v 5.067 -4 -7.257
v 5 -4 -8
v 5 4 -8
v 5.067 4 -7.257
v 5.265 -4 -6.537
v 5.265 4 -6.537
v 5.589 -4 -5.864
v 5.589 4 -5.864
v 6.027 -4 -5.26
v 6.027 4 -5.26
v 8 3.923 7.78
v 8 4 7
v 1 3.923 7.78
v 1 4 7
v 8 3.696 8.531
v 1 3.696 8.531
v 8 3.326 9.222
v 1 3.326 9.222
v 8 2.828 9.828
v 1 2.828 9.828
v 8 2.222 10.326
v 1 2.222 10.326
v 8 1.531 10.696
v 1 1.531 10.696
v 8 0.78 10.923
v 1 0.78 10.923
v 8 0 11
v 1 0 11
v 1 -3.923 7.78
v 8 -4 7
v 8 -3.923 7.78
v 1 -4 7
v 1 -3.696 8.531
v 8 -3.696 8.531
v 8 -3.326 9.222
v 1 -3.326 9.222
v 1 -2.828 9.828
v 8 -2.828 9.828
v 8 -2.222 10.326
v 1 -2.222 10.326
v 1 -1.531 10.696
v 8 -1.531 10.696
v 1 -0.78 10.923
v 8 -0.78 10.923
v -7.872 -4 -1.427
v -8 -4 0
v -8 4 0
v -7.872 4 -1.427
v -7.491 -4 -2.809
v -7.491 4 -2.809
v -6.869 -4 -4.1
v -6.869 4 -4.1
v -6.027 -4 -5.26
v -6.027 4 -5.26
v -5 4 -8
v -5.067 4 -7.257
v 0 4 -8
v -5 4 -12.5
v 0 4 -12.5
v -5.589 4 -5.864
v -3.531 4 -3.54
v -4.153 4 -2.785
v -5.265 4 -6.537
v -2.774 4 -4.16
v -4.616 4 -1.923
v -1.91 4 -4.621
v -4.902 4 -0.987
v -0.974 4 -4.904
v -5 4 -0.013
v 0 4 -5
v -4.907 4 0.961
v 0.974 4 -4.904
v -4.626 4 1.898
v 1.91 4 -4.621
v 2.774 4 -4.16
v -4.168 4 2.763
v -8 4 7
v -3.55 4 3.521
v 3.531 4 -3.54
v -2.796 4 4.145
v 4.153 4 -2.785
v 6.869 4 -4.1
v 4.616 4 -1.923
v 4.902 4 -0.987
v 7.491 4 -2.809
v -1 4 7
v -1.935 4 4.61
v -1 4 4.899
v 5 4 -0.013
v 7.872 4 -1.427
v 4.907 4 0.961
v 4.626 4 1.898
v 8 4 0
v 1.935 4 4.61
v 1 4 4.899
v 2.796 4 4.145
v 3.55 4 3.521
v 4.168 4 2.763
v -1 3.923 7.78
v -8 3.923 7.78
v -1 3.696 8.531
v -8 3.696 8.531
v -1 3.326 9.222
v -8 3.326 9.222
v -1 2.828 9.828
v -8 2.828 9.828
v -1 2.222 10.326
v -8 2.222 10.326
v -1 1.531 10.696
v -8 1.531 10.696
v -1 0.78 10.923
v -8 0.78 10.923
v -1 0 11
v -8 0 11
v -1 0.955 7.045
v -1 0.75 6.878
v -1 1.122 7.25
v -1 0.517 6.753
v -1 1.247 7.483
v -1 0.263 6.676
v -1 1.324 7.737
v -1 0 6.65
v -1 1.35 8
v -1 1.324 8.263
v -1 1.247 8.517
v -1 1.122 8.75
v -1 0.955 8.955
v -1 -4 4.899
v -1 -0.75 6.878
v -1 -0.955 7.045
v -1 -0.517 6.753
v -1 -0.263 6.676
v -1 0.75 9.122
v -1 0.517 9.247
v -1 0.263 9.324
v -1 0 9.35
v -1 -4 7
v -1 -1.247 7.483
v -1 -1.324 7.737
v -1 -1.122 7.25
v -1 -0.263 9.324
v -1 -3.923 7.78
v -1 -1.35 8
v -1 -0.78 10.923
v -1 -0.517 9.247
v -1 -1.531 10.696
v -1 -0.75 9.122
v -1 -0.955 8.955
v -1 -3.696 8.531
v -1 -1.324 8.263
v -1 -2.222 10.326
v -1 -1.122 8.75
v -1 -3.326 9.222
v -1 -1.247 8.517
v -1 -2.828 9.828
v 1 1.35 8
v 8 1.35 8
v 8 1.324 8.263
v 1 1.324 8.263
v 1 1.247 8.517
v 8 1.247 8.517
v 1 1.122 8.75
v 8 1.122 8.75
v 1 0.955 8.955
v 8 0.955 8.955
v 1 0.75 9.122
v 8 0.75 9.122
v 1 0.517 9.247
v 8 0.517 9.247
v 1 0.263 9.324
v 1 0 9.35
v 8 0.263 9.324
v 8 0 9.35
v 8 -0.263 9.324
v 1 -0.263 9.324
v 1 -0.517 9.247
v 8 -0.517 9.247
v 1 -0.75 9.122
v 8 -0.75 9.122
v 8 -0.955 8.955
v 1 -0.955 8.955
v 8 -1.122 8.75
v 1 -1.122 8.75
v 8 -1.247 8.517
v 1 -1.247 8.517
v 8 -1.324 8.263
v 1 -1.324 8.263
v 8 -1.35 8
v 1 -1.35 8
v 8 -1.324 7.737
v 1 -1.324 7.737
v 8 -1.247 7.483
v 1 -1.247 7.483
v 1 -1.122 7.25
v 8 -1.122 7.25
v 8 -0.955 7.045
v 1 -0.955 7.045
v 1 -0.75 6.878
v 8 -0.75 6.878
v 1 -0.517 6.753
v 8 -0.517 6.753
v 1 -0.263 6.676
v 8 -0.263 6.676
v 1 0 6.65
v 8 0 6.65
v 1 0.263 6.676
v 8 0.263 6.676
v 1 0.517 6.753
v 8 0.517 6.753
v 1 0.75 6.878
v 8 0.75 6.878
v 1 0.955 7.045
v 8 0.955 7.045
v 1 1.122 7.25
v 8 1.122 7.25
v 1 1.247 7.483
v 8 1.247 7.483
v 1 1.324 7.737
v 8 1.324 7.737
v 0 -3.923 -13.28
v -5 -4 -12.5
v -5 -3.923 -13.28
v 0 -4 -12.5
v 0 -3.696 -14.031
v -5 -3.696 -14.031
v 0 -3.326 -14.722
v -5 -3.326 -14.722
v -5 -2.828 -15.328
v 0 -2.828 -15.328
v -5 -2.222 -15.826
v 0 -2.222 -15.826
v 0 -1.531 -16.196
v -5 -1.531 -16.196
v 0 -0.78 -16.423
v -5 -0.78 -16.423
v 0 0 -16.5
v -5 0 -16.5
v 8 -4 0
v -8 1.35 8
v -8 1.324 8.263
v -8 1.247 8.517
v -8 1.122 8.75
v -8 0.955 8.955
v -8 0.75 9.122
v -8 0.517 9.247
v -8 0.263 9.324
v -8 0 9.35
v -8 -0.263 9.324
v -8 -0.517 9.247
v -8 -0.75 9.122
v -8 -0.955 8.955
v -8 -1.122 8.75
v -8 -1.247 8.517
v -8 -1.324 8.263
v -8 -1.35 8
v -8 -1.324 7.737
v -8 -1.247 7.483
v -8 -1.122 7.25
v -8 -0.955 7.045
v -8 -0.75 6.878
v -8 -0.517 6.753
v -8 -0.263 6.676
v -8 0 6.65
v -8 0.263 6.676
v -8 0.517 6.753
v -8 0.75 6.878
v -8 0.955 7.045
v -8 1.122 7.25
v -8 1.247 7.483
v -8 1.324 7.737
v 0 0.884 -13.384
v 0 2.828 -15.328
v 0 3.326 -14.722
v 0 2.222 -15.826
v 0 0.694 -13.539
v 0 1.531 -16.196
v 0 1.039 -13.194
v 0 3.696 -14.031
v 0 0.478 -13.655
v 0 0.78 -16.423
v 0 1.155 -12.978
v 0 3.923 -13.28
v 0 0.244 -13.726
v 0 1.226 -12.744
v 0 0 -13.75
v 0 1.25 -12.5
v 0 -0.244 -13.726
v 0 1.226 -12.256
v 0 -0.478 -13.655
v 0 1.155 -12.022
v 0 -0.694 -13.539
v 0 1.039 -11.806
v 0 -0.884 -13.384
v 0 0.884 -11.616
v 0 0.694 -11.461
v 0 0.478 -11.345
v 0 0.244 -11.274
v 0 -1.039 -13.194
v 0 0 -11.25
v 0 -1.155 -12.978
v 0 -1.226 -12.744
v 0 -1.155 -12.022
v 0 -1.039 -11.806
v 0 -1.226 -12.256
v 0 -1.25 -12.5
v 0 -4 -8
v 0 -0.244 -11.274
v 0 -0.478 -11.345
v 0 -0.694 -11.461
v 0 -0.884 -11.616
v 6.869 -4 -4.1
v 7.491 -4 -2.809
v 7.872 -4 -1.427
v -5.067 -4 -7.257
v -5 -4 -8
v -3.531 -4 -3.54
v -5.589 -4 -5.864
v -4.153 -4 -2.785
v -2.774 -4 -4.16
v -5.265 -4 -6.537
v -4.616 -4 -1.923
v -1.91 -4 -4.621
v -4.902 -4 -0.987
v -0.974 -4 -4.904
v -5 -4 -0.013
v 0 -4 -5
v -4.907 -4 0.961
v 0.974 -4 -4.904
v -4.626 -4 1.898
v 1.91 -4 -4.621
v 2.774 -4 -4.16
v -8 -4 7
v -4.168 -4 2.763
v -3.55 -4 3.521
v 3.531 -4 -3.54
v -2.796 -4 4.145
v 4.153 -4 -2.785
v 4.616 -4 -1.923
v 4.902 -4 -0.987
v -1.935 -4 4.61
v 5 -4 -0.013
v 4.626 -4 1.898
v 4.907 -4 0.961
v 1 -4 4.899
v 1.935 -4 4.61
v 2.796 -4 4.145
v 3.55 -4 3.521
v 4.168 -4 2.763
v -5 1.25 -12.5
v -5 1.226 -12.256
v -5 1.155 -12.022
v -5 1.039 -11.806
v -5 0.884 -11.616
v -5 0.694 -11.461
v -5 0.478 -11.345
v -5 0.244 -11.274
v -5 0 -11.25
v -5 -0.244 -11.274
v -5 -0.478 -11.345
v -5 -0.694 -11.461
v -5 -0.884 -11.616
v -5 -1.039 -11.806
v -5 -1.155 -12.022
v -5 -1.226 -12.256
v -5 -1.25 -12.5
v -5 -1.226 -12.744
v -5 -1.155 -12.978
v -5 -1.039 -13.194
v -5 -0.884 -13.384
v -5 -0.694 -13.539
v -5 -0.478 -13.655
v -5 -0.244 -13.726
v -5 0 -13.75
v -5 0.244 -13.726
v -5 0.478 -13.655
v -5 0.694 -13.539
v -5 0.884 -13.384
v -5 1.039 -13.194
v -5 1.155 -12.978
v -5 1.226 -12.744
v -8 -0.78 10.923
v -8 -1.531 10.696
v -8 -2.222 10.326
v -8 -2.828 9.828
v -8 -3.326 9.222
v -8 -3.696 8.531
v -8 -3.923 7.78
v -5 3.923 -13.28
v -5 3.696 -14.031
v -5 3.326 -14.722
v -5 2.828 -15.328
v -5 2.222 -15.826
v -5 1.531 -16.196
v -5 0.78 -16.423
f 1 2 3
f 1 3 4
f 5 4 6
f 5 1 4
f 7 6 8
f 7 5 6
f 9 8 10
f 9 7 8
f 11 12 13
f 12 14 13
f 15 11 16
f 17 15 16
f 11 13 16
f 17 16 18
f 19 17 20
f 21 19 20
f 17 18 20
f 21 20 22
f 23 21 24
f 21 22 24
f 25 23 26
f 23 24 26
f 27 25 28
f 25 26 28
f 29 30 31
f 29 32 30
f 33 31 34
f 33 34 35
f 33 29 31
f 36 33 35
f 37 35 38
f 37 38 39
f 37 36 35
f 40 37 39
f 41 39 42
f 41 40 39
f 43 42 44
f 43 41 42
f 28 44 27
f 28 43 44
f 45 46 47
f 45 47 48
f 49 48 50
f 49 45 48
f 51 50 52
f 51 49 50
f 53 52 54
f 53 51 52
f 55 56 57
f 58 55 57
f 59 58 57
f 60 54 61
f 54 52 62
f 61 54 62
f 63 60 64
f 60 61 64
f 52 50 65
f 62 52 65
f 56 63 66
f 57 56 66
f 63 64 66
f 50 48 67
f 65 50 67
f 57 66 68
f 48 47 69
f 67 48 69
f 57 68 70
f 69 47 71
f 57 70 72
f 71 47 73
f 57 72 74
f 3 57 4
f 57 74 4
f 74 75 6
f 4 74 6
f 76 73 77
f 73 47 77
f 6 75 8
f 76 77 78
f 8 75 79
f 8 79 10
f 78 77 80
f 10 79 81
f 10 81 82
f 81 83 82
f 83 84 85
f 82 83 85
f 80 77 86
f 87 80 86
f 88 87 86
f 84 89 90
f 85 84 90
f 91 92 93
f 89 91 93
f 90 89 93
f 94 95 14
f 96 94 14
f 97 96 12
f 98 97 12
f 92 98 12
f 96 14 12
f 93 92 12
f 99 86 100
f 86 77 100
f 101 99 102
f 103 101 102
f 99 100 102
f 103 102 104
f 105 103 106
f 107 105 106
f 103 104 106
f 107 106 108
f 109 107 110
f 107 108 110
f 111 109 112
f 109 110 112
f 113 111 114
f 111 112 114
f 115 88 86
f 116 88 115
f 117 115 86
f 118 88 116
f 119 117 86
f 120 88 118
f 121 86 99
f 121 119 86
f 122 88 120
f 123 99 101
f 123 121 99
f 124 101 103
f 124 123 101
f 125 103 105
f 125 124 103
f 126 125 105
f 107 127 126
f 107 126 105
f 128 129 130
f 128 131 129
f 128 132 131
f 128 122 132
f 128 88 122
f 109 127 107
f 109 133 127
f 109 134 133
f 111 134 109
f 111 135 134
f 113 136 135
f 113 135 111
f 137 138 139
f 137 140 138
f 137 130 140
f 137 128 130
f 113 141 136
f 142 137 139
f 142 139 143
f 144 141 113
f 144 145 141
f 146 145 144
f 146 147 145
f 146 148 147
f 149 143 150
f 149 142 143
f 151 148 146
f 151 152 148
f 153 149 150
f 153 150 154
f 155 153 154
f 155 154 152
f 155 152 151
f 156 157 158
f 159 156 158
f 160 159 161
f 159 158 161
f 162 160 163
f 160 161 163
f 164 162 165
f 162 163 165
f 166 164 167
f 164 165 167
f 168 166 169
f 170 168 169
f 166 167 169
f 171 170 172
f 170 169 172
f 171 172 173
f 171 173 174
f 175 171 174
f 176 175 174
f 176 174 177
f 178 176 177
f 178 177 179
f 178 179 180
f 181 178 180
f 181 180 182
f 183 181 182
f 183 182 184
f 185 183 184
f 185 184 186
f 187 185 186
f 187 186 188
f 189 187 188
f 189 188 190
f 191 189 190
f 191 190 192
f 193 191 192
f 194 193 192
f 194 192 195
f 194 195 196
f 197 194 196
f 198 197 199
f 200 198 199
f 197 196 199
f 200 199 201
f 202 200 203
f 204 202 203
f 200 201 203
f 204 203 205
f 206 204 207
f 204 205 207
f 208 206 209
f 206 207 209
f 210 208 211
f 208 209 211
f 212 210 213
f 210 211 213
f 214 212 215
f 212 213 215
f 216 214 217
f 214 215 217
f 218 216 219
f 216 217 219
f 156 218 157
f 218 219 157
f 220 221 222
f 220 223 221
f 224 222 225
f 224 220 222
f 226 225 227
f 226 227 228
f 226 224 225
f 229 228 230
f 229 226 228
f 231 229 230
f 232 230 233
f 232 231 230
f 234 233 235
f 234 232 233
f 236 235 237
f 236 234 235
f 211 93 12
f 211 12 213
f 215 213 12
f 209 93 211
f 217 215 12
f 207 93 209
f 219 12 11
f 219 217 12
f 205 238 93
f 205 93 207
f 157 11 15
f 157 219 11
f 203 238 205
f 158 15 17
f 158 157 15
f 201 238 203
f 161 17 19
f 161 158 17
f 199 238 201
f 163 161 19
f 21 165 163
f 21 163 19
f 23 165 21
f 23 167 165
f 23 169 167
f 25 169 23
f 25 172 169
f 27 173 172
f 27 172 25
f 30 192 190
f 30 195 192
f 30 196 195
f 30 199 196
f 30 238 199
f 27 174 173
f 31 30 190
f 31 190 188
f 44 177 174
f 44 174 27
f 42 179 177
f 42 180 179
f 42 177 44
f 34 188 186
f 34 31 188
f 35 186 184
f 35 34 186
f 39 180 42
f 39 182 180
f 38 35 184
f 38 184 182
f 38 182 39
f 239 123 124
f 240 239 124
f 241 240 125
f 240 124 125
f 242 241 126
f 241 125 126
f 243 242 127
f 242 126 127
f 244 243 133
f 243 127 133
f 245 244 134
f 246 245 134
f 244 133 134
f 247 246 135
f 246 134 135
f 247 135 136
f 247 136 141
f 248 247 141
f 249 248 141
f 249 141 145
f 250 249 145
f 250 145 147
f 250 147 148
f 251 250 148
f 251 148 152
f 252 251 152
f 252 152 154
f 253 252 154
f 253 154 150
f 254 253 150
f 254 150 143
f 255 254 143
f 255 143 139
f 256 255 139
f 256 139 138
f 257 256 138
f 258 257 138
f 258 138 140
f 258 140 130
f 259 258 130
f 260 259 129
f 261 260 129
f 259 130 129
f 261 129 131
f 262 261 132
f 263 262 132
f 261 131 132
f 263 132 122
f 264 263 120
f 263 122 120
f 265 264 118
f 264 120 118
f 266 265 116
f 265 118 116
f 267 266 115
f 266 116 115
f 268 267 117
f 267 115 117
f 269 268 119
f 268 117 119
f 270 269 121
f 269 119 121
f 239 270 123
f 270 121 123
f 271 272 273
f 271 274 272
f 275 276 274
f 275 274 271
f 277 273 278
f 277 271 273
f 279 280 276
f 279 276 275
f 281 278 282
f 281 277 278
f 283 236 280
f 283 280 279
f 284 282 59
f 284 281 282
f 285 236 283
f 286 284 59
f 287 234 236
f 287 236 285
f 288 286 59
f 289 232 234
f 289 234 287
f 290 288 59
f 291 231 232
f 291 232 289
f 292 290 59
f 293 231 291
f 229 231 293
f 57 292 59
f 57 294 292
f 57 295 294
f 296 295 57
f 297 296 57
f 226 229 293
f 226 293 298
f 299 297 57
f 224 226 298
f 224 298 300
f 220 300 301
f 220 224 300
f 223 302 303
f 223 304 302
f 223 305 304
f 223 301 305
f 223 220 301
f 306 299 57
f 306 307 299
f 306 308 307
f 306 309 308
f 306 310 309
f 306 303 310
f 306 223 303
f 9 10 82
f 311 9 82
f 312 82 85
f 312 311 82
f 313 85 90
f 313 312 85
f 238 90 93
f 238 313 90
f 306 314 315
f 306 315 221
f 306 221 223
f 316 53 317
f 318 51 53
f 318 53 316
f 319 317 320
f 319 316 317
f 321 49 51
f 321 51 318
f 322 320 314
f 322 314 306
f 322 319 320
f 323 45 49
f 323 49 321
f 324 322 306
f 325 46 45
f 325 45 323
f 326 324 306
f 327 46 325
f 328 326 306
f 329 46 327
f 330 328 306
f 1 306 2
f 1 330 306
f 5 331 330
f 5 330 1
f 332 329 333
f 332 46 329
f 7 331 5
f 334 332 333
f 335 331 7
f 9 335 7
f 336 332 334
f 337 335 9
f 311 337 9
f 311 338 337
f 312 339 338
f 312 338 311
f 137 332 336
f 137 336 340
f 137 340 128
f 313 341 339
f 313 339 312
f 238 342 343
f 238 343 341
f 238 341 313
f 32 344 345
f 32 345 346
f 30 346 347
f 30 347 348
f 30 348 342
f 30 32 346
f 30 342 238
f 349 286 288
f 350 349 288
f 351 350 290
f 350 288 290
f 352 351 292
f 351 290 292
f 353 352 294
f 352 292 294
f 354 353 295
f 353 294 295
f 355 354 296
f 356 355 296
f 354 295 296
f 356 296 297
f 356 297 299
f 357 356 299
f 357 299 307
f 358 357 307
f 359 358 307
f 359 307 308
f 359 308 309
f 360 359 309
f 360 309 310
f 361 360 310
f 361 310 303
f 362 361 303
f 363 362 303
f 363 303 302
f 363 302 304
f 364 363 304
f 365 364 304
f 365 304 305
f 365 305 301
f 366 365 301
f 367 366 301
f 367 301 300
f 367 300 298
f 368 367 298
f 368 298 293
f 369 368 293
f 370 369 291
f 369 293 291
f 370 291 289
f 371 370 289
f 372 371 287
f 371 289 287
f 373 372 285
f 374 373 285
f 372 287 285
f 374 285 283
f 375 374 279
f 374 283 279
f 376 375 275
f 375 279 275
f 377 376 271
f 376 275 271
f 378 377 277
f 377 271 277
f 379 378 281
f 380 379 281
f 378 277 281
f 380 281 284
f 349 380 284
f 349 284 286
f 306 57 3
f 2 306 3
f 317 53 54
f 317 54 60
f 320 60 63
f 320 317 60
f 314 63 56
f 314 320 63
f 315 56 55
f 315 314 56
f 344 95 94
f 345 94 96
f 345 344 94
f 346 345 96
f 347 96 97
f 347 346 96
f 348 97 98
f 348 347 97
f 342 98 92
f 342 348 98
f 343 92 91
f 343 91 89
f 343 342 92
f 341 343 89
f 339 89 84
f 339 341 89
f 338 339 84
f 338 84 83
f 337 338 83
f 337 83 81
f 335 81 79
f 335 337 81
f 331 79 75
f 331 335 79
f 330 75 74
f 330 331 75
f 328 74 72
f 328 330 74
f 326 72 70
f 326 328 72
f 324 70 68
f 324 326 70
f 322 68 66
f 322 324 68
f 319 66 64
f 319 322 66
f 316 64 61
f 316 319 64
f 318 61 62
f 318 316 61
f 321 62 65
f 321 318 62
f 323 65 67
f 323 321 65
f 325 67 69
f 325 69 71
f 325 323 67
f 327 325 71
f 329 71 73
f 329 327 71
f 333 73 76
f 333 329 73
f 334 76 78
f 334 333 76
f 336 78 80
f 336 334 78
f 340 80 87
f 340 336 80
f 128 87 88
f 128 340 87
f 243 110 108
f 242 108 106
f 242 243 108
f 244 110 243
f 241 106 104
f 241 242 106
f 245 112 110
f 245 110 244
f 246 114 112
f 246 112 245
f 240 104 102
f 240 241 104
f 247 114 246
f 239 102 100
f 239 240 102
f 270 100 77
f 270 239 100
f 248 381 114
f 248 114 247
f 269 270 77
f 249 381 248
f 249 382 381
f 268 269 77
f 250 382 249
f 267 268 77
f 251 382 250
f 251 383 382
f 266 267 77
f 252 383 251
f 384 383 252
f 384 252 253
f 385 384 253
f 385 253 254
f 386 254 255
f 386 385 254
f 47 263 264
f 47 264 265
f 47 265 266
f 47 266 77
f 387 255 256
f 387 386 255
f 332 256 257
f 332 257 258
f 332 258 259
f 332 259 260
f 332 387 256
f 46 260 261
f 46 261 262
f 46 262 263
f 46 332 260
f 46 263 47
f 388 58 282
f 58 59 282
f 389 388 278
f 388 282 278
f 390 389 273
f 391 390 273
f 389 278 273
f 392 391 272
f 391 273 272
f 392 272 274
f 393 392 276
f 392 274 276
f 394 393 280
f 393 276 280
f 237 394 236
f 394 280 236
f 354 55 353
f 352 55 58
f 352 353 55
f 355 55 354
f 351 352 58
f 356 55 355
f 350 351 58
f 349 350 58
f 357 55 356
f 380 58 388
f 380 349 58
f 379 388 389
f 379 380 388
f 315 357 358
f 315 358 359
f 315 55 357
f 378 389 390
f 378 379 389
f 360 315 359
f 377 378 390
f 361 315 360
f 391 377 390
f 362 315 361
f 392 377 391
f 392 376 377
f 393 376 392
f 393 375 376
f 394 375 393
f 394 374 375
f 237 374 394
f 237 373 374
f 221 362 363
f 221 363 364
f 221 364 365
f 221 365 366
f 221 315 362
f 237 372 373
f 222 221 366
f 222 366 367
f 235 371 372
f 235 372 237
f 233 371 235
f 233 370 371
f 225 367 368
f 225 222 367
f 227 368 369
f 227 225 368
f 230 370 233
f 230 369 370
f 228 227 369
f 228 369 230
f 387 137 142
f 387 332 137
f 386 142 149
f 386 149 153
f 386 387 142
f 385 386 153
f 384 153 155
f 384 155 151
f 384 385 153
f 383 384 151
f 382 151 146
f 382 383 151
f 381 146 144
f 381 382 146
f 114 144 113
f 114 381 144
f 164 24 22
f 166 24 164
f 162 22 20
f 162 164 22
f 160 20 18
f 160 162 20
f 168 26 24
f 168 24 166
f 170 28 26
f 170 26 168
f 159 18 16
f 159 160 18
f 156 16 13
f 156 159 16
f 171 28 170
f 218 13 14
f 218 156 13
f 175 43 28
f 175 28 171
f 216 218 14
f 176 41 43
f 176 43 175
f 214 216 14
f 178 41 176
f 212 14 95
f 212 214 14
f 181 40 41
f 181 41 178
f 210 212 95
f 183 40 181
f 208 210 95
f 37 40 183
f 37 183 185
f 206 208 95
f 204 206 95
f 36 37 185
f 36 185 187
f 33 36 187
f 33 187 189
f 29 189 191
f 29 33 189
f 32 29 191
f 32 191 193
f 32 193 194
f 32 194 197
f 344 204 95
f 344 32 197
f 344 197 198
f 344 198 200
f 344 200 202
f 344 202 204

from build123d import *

# Parameters (mm, degrees)
F1_DEPTH = 4
F2_R     = 1.35
F3_DEPTH = 25
F4_R     = 1.25
F5_DEPTH = 25
F6_R     = 3.99999


# Not quite as in the source:
# - a fillet or chamfer is up to 0.001 mm smaller than in the source, because OpenCascade refuses the exact size
# - a feature names something its author has since deleted; it is built from what else it names


with BuildPart() as f1:
    # F0 (on Front) → F1 (new body, symmetric)
    with BuildSketch(Plane.XZ):
        with BuildLine():
            ThreePointArc((1, 4.8989794856), (0, -5), (-1, 4.8989794856))
            Line((-1, 4.8989794856), (-1, 11))
            Line((-1, 11), (-8, 11))
            Line((-8, 11), (-8, 0))
            ThreePointArc((-8, 0), (-7.4906334206, -2.8089875327), (-6.0273972603, -5.2602739726))
            ThreePointArc((-6.0273972603, -5.2602739726), (-5.2652950935, -6.53698566), (-5, -8))
            Line((-5, -8), (-5, -16.5))
            Line((-5, -16.5), (0, -16.5))
            Line((0, -16.5), (0, -8))
            Line((0, -8), (5, -8))
            ThreePointArc((5, -8), (5.2652950935, -6.53698566), (6.0273972603, -5.2602739726))
            ThreePointArc((6.0273972603, -5.2602739726), (7.4906334206, -2.8089875327), (8, 0))
            Line((8, 0), (8, 11))
            Line((8, 11), (1, 11))
            Line((1, 11), (1, 4.8989794856))
        make_face()
    extrude(amount=F1_DEPTH, both=True)

    # F2 (on face) → F3 (cut)
    with BuildSketch(Plane.YZ.offset(8)):
        with Locations((0, 8)):
            Circle(F2_R)
    extrude(amount=-F3_DEPTH, mode=Mode.SUBTRACT)

    # F4 (on face) → F5 (cut)
    with BuildSketch(Plane.YZ):
        with Locations((0, -12.5)):
            Circle(F4_R)
    extrude(amount=-F5_DEPTH, mode=Mode.SUBTRACT)

    # F6 (radius 4 in the source; OpenCascade refuses exactly that, so slightly less here)
    f6_edges = [f1.edges().sort_by_distance(p)[0] for p in [
        (-4.5, -4, 11),
        (-4.5, 4, 11),
        (4.5, 4, 11),
        (-2.5, -4, -16.5),
        (-2.5, 4, -16.5),
        (4.5, -4, 11),
    ]]
    fillet(f6_edges, radius=F6_R)


solid = f1.part
